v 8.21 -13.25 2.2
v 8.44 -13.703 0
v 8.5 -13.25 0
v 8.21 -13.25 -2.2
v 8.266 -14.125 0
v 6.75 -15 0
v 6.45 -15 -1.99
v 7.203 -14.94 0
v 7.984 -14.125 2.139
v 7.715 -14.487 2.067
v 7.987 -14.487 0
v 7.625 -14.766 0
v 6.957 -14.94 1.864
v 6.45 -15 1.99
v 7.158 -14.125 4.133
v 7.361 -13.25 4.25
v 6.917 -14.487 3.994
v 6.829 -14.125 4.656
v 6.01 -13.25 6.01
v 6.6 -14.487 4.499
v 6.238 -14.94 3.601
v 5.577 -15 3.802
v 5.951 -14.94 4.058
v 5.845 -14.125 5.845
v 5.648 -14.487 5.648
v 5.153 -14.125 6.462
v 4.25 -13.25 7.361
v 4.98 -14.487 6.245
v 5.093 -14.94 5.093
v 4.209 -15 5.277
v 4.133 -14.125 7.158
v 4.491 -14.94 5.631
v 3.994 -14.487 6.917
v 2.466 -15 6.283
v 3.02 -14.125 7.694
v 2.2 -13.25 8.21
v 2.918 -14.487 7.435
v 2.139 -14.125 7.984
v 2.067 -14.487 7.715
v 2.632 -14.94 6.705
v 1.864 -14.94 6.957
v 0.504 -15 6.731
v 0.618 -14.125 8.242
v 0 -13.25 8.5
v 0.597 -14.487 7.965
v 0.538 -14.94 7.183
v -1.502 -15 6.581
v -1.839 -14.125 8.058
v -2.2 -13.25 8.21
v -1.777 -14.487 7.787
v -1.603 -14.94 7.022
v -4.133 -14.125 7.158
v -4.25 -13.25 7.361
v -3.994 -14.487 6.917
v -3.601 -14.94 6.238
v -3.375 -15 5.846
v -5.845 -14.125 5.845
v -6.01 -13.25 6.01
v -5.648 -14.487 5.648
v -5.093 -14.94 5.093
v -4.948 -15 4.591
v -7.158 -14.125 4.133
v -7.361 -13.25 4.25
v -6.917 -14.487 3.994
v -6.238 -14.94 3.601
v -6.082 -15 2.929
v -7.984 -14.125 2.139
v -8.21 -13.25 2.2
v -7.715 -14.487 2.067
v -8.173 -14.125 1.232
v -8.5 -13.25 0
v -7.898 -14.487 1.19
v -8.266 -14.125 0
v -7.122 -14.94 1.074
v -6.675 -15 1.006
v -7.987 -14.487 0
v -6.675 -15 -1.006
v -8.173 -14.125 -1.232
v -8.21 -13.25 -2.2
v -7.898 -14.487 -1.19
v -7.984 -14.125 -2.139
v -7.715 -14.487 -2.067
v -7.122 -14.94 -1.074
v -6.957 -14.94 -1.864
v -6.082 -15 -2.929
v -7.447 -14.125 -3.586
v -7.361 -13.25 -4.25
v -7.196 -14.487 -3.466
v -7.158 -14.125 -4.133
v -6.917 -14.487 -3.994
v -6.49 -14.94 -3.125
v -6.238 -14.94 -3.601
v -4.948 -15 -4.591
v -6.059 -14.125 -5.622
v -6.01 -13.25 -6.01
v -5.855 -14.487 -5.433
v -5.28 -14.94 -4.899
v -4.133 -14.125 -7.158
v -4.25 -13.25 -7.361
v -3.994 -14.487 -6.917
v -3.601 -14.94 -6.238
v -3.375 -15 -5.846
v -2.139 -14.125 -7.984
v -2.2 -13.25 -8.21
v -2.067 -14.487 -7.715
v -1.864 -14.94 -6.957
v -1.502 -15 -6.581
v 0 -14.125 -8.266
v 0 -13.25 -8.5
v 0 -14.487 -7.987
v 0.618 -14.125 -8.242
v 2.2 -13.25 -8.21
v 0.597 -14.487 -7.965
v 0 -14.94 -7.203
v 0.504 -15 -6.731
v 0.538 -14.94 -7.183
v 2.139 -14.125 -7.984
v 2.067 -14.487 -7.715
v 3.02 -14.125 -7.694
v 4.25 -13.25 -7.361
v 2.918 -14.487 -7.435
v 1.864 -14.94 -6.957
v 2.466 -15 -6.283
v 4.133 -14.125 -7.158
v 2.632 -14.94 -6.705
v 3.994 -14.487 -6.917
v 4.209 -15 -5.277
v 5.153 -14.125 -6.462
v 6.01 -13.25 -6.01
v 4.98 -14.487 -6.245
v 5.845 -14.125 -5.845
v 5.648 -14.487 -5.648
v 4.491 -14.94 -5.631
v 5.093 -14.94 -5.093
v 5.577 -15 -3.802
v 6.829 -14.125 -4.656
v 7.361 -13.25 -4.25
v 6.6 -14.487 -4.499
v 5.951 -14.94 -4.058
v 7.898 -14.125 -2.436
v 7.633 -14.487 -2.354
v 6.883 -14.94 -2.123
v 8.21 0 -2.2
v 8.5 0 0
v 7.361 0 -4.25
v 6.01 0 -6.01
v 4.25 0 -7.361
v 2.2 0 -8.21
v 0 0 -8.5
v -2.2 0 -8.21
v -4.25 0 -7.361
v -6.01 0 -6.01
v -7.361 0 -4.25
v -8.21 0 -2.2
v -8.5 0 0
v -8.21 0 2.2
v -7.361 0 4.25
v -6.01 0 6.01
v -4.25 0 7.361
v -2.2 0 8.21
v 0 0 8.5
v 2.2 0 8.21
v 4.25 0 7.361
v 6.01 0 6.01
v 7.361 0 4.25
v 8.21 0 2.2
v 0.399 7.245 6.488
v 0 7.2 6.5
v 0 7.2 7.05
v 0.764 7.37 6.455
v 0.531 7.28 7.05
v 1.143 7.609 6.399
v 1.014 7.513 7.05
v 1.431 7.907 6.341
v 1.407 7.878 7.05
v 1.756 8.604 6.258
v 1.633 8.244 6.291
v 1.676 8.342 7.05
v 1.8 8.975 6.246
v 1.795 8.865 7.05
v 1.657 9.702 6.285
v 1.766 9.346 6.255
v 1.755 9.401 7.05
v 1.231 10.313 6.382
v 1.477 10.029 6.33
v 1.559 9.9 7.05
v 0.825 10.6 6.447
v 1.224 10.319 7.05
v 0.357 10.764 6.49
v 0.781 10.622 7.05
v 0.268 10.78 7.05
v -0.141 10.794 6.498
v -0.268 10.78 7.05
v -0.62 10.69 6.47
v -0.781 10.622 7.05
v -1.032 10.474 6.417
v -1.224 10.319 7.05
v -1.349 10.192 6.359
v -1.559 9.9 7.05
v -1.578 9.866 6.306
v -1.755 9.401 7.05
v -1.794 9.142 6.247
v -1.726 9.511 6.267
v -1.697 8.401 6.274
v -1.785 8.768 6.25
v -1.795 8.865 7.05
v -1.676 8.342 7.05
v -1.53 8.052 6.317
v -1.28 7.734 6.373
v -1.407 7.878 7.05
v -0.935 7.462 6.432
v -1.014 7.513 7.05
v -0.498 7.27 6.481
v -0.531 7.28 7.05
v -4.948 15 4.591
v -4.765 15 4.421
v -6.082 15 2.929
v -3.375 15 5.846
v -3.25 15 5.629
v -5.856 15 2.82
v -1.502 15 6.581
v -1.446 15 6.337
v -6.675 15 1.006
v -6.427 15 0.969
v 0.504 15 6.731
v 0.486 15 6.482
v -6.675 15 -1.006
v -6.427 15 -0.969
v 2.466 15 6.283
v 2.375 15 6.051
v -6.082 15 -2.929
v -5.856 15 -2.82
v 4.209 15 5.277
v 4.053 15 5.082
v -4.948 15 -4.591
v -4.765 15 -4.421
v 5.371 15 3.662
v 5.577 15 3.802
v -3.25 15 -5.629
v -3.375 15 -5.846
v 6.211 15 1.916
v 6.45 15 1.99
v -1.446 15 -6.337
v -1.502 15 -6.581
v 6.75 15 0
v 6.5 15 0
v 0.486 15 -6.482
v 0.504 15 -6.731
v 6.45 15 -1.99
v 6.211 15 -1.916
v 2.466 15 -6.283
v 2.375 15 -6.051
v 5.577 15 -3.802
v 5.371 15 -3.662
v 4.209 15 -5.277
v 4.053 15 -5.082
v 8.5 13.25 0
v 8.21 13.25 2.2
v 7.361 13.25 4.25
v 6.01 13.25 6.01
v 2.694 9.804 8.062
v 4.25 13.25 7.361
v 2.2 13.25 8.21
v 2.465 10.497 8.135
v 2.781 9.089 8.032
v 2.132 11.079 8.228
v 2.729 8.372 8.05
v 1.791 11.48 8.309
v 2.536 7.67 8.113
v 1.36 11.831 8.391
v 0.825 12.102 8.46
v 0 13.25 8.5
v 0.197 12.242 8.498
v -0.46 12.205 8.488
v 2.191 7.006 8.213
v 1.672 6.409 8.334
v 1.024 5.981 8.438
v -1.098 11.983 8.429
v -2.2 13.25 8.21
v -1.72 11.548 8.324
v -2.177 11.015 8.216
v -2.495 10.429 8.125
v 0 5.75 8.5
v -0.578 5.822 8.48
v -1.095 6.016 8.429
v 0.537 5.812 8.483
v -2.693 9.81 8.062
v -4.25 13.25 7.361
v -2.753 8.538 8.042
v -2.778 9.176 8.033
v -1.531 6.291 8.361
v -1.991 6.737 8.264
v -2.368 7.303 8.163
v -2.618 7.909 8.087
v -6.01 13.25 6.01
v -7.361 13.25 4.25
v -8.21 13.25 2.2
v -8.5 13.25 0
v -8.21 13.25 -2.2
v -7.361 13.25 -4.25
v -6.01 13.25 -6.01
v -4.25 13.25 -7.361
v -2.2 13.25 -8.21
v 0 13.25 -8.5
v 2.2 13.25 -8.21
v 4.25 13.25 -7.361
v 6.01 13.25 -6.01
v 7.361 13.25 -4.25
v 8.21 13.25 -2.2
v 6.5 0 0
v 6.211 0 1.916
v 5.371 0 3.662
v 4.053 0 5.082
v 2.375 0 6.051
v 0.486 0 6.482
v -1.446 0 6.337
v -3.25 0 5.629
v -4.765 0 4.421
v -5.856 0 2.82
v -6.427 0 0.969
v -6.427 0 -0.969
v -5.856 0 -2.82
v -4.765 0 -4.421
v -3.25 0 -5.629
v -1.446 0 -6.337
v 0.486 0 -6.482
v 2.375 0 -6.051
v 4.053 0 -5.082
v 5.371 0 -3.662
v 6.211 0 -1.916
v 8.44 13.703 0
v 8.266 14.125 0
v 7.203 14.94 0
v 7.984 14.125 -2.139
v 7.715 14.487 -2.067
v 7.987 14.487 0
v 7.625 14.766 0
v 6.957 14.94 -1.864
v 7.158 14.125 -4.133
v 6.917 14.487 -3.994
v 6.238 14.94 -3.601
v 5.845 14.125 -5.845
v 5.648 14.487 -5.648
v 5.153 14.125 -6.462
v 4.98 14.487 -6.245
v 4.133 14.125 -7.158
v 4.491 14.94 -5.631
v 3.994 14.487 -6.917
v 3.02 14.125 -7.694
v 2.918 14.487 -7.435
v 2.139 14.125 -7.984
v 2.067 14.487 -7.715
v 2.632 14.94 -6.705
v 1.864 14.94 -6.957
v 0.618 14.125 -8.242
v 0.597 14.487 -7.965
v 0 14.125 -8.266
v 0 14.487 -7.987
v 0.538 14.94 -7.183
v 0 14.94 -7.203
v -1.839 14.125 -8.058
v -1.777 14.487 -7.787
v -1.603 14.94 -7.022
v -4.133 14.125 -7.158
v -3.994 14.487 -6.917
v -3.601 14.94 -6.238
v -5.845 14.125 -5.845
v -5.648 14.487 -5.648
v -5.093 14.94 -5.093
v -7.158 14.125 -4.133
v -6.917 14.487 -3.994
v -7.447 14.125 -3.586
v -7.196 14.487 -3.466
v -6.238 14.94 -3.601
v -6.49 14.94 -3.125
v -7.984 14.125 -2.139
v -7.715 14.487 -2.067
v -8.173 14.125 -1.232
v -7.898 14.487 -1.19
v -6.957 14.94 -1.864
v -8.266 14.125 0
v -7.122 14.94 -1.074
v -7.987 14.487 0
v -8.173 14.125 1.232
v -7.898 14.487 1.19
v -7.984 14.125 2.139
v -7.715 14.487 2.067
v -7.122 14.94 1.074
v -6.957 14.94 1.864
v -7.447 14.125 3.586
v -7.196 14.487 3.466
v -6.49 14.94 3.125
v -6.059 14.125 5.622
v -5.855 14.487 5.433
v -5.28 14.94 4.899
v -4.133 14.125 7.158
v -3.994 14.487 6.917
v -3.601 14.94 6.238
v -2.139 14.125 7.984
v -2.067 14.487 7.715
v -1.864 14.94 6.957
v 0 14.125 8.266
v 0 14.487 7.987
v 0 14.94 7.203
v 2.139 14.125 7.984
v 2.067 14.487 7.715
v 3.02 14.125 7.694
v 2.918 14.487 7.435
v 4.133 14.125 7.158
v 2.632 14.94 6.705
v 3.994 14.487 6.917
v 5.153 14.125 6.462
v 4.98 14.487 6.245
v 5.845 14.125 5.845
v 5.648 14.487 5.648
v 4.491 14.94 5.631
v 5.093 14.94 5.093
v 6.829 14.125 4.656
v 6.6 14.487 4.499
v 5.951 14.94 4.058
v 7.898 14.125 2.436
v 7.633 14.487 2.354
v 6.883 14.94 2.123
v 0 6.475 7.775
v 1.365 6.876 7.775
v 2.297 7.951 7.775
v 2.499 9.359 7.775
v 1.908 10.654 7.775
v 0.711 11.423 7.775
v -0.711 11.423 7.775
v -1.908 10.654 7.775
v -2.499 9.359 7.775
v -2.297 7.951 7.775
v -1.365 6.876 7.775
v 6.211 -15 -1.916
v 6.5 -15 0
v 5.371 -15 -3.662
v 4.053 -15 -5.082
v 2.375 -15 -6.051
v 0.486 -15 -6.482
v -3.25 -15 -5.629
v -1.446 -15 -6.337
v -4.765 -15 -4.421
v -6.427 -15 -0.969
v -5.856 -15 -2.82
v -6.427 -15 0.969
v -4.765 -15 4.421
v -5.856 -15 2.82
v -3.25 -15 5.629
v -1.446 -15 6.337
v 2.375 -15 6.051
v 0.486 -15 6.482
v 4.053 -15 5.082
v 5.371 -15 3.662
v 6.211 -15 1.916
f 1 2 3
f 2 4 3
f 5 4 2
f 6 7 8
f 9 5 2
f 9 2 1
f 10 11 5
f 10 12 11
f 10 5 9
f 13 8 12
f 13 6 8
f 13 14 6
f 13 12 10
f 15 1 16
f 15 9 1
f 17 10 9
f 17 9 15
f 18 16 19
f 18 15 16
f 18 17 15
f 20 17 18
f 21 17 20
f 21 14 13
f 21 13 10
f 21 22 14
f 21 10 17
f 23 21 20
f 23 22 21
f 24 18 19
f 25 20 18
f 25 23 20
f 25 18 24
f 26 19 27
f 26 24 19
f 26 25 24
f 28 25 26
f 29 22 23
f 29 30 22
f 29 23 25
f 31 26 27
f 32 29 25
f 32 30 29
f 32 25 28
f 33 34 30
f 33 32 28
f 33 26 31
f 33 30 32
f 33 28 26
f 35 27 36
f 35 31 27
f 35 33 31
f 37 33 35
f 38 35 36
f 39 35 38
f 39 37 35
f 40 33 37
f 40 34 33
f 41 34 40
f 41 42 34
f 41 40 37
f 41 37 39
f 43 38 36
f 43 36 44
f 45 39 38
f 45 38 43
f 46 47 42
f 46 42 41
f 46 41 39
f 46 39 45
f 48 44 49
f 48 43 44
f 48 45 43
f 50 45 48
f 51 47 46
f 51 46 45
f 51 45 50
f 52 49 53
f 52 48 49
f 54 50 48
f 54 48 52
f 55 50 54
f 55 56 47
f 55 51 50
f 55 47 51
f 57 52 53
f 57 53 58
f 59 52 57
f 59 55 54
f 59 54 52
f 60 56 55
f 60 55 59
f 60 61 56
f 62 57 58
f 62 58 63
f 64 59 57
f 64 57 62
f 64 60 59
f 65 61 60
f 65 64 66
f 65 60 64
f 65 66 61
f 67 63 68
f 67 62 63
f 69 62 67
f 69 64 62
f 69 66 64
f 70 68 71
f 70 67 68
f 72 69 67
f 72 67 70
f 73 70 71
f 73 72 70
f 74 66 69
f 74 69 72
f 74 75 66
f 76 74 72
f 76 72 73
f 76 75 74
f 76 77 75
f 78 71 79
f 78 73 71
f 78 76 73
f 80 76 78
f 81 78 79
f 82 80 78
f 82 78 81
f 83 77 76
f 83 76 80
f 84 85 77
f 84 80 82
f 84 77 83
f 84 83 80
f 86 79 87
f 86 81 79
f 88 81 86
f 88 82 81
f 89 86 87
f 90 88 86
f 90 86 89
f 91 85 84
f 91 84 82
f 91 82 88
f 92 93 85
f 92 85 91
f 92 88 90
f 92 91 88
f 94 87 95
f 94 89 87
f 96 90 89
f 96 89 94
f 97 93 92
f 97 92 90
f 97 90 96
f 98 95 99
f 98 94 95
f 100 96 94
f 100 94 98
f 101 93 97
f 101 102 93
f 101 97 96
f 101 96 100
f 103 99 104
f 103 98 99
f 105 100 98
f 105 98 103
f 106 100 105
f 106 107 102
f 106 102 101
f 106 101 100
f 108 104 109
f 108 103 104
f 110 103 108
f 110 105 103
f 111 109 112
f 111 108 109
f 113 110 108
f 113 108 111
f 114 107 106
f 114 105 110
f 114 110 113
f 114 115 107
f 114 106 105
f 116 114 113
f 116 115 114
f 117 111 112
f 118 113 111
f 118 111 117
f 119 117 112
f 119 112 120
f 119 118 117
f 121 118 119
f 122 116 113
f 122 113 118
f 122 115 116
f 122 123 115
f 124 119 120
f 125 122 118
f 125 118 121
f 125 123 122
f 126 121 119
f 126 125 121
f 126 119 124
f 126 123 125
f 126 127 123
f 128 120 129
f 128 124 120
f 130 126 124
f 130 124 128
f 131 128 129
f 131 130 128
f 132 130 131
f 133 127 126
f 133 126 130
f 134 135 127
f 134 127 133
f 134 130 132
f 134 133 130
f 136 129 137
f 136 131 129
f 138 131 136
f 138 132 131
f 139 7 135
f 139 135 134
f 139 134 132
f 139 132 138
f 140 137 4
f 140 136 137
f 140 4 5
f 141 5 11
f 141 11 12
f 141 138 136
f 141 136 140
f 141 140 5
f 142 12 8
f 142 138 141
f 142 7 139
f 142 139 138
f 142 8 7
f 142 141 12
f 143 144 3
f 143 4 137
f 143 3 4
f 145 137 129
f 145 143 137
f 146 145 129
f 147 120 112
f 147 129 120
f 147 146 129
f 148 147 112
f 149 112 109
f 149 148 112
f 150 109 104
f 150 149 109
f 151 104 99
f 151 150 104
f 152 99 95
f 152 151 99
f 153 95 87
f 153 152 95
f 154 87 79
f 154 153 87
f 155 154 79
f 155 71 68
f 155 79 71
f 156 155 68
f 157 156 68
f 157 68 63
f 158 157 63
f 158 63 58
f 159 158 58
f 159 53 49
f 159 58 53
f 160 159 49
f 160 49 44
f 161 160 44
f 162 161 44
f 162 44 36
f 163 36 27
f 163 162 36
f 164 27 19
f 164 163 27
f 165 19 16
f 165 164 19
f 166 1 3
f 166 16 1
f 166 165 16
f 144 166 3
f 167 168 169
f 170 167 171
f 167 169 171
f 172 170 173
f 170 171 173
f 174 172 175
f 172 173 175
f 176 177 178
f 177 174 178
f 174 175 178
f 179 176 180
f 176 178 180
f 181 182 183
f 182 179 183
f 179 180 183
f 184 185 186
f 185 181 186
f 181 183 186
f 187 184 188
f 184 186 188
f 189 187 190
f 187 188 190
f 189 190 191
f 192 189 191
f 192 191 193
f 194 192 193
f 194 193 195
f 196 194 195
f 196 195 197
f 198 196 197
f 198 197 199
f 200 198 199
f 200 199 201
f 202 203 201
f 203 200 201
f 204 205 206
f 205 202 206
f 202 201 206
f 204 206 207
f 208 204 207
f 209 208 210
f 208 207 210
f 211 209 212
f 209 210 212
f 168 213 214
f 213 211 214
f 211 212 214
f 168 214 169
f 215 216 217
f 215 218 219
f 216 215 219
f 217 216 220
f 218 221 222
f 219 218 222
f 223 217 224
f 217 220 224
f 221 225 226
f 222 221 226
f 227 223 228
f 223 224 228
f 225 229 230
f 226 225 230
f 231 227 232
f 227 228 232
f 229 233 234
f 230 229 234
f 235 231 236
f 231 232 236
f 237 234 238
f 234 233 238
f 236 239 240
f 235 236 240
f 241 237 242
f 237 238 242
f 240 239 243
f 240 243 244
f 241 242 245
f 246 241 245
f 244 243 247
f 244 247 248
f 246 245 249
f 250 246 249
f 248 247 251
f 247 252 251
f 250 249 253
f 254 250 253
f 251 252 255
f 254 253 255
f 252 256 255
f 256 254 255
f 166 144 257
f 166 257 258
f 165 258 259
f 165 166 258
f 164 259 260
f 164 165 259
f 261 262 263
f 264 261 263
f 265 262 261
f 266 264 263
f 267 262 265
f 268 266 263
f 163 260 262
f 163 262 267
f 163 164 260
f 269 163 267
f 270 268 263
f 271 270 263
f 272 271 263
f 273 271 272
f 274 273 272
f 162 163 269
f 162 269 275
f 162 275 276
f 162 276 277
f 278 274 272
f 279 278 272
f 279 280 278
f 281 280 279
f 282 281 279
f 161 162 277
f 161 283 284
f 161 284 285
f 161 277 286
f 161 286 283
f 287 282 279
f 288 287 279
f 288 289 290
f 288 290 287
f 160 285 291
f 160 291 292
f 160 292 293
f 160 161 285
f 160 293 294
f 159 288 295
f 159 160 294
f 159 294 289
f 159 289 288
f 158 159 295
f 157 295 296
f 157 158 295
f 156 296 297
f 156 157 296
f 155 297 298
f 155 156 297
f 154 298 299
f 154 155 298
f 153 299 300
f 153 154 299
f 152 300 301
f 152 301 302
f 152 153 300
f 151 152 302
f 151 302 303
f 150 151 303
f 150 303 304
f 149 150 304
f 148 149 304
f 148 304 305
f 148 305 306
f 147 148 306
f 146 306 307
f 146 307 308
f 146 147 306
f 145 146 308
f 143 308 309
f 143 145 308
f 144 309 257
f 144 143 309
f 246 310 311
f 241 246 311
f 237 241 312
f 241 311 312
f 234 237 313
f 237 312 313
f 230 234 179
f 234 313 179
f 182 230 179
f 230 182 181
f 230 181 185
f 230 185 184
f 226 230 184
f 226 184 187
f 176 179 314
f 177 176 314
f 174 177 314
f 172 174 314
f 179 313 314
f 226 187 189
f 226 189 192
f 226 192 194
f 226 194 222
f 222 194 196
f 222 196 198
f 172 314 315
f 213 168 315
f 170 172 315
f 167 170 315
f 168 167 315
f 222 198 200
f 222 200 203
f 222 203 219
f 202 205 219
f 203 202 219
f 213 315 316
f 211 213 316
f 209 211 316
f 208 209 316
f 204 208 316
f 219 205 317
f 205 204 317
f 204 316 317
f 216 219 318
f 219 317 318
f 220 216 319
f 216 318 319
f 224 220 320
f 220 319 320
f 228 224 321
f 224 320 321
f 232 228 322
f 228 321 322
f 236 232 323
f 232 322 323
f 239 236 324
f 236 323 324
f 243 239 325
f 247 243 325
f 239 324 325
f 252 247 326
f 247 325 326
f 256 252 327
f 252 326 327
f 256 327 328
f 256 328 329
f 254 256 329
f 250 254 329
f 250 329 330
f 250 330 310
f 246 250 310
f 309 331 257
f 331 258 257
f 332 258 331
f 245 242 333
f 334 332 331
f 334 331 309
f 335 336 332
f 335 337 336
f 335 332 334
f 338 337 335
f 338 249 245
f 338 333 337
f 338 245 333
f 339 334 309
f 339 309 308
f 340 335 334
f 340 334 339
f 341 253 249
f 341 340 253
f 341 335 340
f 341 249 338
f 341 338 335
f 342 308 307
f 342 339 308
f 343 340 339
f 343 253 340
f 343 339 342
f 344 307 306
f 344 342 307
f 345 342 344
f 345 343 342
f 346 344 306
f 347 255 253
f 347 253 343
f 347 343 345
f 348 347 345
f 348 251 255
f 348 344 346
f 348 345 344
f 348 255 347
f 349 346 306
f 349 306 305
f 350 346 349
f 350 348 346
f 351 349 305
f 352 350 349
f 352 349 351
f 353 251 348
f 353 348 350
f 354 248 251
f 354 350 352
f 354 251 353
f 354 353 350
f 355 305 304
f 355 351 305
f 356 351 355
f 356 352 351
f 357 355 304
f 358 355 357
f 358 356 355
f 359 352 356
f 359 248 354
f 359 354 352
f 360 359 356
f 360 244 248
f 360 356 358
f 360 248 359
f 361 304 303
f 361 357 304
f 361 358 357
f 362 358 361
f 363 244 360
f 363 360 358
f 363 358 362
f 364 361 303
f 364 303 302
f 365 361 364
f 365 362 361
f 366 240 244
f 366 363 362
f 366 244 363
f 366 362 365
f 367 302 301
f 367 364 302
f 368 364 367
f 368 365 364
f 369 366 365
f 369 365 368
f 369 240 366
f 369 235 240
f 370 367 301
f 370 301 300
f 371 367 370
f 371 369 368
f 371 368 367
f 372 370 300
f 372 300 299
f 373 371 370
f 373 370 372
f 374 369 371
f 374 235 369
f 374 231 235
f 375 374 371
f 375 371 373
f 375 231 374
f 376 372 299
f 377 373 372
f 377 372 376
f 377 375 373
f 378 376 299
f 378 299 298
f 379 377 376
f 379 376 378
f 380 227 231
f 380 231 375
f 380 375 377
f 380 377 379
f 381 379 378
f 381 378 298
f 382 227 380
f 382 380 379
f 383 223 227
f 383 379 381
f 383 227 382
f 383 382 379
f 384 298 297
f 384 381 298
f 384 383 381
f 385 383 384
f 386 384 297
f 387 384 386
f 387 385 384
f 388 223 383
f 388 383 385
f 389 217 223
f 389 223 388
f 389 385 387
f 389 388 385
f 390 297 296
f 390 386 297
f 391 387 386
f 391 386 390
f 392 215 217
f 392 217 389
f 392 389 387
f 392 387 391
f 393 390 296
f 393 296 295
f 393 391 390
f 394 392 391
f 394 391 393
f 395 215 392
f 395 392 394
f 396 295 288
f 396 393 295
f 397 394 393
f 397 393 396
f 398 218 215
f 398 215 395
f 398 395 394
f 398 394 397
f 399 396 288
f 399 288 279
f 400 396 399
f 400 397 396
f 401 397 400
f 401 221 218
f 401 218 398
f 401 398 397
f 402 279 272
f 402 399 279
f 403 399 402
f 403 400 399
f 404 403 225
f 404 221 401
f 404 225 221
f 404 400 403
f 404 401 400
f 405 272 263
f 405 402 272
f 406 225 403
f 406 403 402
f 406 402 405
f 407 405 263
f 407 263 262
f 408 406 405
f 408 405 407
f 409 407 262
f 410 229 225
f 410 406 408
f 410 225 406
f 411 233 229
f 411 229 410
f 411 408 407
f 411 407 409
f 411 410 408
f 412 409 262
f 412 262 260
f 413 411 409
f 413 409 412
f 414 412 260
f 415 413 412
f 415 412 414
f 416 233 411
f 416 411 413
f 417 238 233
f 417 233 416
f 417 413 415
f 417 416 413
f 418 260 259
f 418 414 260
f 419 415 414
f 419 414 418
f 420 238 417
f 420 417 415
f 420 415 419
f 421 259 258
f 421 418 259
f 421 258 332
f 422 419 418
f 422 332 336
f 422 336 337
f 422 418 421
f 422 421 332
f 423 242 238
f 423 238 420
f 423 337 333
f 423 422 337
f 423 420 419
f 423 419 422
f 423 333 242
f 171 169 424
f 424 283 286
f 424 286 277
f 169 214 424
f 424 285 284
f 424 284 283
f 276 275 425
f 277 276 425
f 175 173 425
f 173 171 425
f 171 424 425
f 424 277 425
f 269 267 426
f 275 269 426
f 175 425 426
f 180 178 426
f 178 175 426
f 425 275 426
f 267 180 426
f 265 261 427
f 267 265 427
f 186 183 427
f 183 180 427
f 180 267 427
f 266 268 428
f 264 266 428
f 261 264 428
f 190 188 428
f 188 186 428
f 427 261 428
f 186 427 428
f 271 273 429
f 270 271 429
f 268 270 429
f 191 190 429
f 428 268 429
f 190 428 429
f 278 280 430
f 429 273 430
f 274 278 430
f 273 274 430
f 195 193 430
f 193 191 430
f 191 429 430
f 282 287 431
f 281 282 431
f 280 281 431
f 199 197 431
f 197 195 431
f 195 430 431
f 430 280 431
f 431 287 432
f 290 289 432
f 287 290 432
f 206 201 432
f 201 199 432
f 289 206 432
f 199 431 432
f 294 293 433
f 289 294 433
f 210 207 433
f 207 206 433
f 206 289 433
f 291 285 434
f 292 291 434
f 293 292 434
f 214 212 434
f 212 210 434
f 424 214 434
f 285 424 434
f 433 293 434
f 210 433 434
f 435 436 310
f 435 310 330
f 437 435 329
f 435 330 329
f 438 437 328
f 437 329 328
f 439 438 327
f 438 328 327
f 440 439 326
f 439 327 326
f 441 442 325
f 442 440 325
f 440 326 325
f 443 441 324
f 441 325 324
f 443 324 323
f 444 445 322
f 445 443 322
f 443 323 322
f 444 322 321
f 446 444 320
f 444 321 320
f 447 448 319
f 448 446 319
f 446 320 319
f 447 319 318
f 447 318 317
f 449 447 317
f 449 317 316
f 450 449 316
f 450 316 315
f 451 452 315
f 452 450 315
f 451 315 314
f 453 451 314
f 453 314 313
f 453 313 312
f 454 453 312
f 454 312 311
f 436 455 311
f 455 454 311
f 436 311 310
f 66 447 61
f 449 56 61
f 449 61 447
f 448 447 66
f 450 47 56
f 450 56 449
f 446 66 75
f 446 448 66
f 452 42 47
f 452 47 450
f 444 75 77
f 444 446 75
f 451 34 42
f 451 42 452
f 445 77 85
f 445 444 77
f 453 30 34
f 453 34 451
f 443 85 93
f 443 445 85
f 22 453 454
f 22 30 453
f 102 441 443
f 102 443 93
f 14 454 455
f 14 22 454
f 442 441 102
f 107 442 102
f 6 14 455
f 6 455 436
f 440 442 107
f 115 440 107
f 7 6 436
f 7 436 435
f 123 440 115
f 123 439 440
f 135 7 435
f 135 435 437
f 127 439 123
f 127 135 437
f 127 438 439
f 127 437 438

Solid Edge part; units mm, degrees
sketch "Sketch1" plane through (0, 0, 0) normal (0, -1, 0) x (1, 0, 0)
  circle A0 centre (0, 0) radius 6.5
  circle A1 centre (0, 0) radius 8.5
  dimension "D1" = 13
  dimension "D2" = 17
extrude "Protrusion1" add sketch "Sketch1" along normal mid plane 30
fillet "Verrundung_1" radius 1.75 2 edges at (-8.5, 15, 0) (-8.5, -15, 0)
hole "Bohrung_2" at (0, 9, 8.5) direction (0, 0, -1) diameter 3.6 end up to next countersink diameter 6.5 countersink angle 90
properties material "Aluminiumlegierung:3.0205, Al 99.0, EN-AW 1200"
